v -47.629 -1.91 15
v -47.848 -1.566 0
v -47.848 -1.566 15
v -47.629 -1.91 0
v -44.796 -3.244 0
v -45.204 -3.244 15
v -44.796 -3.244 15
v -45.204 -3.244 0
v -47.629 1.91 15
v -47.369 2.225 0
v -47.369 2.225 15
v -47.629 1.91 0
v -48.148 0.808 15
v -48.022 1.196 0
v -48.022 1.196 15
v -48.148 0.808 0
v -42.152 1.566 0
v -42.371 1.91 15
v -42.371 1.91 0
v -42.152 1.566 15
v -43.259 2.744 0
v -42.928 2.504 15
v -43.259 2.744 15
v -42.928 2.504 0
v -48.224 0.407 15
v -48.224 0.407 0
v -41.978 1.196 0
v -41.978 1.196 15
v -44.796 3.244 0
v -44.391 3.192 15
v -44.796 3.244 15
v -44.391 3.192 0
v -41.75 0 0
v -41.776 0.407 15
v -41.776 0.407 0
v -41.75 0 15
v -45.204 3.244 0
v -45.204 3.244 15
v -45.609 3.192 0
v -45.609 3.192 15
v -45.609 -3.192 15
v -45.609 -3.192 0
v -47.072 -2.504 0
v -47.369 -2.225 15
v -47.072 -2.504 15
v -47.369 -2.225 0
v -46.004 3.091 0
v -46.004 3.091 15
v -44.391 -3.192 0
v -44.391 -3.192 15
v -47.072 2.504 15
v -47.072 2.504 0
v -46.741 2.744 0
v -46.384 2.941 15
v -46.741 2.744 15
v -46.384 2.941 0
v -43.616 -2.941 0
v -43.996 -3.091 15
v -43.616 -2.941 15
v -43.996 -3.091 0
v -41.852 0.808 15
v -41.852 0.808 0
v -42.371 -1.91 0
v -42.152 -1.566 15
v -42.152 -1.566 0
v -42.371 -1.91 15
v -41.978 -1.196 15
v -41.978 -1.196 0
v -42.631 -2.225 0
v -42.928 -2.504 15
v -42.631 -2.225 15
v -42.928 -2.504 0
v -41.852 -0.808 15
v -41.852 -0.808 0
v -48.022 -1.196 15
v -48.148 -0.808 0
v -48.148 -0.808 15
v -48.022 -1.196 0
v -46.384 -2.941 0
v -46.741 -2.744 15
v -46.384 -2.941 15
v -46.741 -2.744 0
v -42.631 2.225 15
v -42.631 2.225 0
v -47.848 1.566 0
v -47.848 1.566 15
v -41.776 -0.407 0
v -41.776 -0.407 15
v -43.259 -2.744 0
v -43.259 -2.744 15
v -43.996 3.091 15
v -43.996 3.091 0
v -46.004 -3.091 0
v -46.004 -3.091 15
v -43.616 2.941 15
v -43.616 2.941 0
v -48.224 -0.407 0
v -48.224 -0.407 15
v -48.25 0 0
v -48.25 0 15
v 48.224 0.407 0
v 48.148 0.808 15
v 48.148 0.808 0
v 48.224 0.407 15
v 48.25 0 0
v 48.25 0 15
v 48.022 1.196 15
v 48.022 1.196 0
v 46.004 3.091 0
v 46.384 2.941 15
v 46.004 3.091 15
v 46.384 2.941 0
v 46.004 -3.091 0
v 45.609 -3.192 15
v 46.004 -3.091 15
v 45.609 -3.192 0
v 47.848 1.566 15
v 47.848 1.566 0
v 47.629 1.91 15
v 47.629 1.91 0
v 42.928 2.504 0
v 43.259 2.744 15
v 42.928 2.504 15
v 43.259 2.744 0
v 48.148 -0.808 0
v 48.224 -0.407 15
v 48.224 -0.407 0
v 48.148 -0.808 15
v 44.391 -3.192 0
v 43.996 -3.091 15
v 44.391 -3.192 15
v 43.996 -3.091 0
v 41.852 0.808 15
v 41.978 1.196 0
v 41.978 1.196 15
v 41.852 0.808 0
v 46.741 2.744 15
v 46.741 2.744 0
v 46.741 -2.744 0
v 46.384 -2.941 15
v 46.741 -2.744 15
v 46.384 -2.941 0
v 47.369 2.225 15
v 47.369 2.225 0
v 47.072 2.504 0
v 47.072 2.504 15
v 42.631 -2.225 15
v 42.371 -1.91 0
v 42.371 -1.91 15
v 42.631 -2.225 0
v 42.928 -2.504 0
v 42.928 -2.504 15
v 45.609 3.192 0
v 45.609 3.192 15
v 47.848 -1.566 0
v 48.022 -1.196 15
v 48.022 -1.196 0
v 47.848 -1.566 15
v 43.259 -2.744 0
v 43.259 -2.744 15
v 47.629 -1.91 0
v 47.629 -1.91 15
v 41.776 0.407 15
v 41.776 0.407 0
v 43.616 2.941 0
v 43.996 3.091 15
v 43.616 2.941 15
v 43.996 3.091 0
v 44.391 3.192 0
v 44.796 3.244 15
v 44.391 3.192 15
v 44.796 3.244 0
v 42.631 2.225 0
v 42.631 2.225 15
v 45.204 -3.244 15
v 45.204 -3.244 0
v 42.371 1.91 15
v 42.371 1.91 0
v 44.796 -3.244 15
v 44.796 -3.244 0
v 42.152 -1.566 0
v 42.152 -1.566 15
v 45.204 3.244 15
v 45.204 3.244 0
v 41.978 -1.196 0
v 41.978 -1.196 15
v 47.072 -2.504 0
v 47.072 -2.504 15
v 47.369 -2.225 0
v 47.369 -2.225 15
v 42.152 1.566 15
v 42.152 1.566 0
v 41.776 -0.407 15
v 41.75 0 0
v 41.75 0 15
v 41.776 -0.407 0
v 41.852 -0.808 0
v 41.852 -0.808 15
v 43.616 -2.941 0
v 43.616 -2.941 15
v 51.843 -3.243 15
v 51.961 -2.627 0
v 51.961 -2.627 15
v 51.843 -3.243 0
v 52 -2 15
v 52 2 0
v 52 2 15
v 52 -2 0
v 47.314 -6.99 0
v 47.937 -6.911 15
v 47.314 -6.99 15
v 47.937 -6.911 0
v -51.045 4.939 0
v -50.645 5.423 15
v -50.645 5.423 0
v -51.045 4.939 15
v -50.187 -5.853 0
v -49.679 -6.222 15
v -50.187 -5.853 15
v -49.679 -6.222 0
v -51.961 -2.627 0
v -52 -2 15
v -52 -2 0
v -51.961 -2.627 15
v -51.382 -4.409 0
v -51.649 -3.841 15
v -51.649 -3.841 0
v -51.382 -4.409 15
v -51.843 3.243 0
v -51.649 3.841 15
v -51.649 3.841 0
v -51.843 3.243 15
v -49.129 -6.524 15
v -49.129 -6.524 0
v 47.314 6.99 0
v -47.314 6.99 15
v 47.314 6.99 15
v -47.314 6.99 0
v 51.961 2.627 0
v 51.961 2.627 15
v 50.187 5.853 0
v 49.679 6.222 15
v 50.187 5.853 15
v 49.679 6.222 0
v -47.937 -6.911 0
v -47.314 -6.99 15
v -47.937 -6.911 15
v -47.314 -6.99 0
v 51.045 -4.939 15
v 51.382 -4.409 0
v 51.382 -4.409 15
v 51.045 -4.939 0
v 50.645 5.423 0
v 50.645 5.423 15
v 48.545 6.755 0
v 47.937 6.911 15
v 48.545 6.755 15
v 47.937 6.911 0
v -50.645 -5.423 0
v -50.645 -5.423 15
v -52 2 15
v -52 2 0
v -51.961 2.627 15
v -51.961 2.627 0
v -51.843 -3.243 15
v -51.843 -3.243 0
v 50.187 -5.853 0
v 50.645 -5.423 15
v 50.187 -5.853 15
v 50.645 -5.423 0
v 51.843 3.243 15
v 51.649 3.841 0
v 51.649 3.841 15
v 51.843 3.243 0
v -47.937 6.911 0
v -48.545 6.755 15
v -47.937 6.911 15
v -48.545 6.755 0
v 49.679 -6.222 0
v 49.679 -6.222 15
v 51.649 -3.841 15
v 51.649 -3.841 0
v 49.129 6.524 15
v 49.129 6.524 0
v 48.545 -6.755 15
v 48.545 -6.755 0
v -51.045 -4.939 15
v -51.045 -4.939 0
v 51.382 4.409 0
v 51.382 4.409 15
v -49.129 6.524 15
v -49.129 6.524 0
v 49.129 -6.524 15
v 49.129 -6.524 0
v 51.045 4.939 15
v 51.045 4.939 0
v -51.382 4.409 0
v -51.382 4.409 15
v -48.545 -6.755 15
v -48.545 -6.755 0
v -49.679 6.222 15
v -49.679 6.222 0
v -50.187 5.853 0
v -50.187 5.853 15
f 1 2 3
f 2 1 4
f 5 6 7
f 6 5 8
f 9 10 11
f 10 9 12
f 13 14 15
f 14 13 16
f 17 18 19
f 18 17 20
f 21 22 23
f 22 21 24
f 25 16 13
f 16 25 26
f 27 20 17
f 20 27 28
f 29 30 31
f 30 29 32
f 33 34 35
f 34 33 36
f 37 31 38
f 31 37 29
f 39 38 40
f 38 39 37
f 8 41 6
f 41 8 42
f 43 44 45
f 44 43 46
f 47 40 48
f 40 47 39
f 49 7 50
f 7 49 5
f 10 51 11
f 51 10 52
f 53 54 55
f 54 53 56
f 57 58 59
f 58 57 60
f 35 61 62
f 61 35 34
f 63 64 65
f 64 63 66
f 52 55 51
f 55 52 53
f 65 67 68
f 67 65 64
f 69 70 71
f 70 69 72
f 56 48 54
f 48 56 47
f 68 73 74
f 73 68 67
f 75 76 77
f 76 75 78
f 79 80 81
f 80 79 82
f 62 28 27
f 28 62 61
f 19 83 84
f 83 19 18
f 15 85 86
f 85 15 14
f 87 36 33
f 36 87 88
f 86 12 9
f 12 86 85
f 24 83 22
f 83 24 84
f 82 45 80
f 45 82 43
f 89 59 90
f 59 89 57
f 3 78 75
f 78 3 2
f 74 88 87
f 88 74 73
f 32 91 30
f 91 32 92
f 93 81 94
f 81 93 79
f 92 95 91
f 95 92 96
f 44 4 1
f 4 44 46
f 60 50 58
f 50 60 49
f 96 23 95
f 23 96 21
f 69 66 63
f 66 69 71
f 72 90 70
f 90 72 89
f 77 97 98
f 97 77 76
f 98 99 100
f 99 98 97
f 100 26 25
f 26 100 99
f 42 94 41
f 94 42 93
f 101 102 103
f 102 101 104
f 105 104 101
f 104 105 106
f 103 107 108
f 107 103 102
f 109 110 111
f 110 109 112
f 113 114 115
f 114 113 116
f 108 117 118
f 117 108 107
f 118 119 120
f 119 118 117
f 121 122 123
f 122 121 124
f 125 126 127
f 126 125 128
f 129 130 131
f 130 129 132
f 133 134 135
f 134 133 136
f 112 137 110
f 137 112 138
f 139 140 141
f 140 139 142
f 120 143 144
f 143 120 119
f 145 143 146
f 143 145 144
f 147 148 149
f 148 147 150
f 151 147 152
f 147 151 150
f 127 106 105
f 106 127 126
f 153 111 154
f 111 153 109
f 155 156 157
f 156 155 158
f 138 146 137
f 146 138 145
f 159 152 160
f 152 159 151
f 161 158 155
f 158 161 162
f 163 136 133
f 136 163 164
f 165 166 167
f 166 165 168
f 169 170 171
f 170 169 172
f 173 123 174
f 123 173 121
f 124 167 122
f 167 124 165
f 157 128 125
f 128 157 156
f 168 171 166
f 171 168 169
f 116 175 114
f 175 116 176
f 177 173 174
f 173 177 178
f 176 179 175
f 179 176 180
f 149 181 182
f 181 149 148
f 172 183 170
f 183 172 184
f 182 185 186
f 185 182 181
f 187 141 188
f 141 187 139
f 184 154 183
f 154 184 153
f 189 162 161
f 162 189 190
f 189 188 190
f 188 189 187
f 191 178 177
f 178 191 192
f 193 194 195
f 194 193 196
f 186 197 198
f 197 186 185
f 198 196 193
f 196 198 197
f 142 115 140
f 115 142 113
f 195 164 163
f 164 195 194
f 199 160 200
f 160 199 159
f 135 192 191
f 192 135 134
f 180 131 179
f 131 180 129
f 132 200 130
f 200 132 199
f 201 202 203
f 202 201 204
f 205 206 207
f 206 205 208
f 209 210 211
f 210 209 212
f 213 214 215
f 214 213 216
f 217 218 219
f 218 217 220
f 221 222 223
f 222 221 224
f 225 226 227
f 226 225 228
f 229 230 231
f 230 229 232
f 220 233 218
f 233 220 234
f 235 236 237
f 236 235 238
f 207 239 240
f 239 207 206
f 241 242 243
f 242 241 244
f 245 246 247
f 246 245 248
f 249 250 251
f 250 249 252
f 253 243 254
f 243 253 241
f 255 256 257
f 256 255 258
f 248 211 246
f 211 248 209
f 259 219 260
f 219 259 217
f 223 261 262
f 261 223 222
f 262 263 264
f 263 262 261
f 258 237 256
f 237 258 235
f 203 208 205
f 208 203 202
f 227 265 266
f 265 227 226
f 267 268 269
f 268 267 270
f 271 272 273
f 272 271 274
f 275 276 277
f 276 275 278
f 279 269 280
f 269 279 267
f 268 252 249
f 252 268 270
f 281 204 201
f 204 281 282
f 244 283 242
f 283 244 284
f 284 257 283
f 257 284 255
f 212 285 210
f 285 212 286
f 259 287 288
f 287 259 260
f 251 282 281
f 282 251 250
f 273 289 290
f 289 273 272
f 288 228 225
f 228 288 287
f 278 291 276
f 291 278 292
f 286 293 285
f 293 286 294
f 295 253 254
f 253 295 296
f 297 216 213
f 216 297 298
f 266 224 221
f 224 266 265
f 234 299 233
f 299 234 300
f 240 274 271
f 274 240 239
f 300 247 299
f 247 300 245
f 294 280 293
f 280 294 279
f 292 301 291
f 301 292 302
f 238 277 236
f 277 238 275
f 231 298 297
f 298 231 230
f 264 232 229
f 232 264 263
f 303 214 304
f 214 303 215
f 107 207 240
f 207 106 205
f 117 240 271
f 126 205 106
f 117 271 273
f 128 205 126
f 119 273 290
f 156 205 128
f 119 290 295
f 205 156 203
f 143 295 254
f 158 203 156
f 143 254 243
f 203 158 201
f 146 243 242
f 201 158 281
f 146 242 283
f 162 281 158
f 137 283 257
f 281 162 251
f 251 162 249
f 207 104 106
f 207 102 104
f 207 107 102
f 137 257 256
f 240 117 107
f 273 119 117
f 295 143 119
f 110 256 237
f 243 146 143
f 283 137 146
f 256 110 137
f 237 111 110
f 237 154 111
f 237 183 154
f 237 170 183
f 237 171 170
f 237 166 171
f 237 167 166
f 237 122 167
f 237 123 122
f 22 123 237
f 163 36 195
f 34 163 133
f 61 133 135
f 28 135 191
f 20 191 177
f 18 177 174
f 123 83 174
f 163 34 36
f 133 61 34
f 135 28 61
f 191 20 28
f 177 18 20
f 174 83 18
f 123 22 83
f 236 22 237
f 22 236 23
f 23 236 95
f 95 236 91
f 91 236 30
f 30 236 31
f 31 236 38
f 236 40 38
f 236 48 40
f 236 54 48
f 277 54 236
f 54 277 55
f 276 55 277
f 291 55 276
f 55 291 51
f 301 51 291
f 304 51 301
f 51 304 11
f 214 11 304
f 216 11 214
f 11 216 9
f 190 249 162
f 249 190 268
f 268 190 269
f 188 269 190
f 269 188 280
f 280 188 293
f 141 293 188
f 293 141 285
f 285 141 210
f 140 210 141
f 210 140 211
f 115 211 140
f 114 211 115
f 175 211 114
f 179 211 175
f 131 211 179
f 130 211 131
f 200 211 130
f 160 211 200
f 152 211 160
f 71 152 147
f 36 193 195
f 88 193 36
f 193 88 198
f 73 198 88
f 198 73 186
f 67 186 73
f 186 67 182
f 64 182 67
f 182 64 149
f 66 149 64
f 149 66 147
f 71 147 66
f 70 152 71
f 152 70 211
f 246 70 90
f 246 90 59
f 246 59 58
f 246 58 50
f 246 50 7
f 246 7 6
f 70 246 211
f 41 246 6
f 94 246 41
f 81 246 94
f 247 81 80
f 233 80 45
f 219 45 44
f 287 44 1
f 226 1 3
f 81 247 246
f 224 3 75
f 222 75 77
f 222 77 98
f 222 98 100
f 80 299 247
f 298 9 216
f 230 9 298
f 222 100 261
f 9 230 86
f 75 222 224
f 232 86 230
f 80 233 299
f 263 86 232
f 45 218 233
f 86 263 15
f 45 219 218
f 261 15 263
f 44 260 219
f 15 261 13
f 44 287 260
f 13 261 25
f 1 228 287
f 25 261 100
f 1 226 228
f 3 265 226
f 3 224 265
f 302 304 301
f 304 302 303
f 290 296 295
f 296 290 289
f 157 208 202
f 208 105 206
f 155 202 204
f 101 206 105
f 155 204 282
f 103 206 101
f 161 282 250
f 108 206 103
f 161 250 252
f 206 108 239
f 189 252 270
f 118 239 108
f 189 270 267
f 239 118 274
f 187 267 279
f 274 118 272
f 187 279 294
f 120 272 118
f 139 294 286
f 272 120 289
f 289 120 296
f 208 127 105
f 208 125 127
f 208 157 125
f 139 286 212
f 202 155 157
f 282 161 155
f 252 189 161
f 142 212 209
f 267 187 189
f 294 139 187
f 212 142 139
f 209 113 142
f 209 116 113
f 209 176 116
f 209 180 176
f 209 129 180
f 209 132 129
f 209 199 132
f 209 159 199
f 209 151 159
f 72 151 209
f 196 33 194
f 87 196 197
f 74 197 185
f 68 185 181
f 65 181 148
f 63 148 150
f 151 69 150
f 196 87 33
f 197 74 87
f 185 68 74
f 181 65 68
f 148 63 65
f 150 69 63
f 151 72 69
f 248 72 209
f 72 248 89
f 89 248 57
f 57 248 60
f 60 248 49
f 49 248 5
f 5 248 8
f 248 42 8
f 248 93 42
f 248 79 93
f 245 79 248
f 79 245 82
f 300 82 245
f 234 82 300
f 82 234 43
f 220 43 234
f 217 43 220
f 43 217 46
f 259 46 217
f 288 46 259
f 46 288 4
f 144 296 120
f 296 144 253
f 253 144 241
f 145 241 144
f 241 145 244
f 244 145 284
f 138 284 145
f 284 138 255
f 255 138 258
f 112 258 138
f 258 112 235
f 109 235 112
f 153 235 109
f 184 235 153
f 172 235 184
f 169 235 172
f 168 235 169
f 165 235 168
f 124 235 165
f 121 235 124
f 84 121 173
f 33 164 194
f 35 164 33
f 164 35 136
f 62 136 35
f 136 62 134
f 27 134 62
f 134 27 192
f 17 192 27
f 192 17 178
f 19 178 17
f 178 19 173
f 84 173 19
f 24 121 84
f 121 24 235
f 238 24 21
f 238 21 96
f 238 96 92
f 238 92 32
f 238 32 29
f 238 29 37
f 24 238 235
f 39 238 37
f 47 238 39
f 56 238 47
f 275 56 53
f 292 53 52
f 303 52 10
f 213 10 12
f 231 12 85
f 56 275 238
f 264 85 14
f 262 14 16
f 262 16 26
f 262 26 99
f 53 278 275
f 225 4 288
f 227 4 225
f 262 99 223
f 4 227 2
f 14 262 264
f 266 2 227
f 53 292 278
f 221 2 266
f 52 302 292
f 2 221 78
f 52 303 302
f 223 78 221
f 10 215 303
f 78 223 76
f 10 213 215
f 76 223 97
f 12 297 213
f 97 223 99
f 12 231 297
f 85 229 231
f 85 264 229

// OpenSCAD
$fn = 50;


difference() {
	union() {
		hull() {
			translate(v = [-47.0000000000, 2.0000000000, 0]) {
				cylinder(h = 15, r = 5);
			}
			translate(v = [47.0000000000, 2.0000000000, 0]) {
				cylinder(h = 15, r = 5);
			}
			translate(v = [-47.0000000000, -2.0000000000, 0]) {
				cylinder(h = 15, r = 5);
			}
			translate(v = [47.0000000000, -2.0000000000, 0]) {
				cylinder(h = 15, r = 5);
			}
		}
	}
	union() {
		translate(v = [-45.0000000000, 0.0000000000, -100.0000000000]) {
			cylinder(h = 200, r = 3.2500000000);
		}
		translate(v = [-45.0000000000, 0.0000000000, -100.0000000000]) {
			cylinder(h = 200, r = 3.2500000000);
		}
		translate(v = [45.0000000000, 0.0000000000, -100.0000000000]) {
			cylinder(h = 200, r = 3.2500000000);
		}
		translate(v = [45.0000000000, 0.0000000000, -100.0000000000]) {
			cylinder(h = 200, r = 3.2500000000);
		}
	}
}
